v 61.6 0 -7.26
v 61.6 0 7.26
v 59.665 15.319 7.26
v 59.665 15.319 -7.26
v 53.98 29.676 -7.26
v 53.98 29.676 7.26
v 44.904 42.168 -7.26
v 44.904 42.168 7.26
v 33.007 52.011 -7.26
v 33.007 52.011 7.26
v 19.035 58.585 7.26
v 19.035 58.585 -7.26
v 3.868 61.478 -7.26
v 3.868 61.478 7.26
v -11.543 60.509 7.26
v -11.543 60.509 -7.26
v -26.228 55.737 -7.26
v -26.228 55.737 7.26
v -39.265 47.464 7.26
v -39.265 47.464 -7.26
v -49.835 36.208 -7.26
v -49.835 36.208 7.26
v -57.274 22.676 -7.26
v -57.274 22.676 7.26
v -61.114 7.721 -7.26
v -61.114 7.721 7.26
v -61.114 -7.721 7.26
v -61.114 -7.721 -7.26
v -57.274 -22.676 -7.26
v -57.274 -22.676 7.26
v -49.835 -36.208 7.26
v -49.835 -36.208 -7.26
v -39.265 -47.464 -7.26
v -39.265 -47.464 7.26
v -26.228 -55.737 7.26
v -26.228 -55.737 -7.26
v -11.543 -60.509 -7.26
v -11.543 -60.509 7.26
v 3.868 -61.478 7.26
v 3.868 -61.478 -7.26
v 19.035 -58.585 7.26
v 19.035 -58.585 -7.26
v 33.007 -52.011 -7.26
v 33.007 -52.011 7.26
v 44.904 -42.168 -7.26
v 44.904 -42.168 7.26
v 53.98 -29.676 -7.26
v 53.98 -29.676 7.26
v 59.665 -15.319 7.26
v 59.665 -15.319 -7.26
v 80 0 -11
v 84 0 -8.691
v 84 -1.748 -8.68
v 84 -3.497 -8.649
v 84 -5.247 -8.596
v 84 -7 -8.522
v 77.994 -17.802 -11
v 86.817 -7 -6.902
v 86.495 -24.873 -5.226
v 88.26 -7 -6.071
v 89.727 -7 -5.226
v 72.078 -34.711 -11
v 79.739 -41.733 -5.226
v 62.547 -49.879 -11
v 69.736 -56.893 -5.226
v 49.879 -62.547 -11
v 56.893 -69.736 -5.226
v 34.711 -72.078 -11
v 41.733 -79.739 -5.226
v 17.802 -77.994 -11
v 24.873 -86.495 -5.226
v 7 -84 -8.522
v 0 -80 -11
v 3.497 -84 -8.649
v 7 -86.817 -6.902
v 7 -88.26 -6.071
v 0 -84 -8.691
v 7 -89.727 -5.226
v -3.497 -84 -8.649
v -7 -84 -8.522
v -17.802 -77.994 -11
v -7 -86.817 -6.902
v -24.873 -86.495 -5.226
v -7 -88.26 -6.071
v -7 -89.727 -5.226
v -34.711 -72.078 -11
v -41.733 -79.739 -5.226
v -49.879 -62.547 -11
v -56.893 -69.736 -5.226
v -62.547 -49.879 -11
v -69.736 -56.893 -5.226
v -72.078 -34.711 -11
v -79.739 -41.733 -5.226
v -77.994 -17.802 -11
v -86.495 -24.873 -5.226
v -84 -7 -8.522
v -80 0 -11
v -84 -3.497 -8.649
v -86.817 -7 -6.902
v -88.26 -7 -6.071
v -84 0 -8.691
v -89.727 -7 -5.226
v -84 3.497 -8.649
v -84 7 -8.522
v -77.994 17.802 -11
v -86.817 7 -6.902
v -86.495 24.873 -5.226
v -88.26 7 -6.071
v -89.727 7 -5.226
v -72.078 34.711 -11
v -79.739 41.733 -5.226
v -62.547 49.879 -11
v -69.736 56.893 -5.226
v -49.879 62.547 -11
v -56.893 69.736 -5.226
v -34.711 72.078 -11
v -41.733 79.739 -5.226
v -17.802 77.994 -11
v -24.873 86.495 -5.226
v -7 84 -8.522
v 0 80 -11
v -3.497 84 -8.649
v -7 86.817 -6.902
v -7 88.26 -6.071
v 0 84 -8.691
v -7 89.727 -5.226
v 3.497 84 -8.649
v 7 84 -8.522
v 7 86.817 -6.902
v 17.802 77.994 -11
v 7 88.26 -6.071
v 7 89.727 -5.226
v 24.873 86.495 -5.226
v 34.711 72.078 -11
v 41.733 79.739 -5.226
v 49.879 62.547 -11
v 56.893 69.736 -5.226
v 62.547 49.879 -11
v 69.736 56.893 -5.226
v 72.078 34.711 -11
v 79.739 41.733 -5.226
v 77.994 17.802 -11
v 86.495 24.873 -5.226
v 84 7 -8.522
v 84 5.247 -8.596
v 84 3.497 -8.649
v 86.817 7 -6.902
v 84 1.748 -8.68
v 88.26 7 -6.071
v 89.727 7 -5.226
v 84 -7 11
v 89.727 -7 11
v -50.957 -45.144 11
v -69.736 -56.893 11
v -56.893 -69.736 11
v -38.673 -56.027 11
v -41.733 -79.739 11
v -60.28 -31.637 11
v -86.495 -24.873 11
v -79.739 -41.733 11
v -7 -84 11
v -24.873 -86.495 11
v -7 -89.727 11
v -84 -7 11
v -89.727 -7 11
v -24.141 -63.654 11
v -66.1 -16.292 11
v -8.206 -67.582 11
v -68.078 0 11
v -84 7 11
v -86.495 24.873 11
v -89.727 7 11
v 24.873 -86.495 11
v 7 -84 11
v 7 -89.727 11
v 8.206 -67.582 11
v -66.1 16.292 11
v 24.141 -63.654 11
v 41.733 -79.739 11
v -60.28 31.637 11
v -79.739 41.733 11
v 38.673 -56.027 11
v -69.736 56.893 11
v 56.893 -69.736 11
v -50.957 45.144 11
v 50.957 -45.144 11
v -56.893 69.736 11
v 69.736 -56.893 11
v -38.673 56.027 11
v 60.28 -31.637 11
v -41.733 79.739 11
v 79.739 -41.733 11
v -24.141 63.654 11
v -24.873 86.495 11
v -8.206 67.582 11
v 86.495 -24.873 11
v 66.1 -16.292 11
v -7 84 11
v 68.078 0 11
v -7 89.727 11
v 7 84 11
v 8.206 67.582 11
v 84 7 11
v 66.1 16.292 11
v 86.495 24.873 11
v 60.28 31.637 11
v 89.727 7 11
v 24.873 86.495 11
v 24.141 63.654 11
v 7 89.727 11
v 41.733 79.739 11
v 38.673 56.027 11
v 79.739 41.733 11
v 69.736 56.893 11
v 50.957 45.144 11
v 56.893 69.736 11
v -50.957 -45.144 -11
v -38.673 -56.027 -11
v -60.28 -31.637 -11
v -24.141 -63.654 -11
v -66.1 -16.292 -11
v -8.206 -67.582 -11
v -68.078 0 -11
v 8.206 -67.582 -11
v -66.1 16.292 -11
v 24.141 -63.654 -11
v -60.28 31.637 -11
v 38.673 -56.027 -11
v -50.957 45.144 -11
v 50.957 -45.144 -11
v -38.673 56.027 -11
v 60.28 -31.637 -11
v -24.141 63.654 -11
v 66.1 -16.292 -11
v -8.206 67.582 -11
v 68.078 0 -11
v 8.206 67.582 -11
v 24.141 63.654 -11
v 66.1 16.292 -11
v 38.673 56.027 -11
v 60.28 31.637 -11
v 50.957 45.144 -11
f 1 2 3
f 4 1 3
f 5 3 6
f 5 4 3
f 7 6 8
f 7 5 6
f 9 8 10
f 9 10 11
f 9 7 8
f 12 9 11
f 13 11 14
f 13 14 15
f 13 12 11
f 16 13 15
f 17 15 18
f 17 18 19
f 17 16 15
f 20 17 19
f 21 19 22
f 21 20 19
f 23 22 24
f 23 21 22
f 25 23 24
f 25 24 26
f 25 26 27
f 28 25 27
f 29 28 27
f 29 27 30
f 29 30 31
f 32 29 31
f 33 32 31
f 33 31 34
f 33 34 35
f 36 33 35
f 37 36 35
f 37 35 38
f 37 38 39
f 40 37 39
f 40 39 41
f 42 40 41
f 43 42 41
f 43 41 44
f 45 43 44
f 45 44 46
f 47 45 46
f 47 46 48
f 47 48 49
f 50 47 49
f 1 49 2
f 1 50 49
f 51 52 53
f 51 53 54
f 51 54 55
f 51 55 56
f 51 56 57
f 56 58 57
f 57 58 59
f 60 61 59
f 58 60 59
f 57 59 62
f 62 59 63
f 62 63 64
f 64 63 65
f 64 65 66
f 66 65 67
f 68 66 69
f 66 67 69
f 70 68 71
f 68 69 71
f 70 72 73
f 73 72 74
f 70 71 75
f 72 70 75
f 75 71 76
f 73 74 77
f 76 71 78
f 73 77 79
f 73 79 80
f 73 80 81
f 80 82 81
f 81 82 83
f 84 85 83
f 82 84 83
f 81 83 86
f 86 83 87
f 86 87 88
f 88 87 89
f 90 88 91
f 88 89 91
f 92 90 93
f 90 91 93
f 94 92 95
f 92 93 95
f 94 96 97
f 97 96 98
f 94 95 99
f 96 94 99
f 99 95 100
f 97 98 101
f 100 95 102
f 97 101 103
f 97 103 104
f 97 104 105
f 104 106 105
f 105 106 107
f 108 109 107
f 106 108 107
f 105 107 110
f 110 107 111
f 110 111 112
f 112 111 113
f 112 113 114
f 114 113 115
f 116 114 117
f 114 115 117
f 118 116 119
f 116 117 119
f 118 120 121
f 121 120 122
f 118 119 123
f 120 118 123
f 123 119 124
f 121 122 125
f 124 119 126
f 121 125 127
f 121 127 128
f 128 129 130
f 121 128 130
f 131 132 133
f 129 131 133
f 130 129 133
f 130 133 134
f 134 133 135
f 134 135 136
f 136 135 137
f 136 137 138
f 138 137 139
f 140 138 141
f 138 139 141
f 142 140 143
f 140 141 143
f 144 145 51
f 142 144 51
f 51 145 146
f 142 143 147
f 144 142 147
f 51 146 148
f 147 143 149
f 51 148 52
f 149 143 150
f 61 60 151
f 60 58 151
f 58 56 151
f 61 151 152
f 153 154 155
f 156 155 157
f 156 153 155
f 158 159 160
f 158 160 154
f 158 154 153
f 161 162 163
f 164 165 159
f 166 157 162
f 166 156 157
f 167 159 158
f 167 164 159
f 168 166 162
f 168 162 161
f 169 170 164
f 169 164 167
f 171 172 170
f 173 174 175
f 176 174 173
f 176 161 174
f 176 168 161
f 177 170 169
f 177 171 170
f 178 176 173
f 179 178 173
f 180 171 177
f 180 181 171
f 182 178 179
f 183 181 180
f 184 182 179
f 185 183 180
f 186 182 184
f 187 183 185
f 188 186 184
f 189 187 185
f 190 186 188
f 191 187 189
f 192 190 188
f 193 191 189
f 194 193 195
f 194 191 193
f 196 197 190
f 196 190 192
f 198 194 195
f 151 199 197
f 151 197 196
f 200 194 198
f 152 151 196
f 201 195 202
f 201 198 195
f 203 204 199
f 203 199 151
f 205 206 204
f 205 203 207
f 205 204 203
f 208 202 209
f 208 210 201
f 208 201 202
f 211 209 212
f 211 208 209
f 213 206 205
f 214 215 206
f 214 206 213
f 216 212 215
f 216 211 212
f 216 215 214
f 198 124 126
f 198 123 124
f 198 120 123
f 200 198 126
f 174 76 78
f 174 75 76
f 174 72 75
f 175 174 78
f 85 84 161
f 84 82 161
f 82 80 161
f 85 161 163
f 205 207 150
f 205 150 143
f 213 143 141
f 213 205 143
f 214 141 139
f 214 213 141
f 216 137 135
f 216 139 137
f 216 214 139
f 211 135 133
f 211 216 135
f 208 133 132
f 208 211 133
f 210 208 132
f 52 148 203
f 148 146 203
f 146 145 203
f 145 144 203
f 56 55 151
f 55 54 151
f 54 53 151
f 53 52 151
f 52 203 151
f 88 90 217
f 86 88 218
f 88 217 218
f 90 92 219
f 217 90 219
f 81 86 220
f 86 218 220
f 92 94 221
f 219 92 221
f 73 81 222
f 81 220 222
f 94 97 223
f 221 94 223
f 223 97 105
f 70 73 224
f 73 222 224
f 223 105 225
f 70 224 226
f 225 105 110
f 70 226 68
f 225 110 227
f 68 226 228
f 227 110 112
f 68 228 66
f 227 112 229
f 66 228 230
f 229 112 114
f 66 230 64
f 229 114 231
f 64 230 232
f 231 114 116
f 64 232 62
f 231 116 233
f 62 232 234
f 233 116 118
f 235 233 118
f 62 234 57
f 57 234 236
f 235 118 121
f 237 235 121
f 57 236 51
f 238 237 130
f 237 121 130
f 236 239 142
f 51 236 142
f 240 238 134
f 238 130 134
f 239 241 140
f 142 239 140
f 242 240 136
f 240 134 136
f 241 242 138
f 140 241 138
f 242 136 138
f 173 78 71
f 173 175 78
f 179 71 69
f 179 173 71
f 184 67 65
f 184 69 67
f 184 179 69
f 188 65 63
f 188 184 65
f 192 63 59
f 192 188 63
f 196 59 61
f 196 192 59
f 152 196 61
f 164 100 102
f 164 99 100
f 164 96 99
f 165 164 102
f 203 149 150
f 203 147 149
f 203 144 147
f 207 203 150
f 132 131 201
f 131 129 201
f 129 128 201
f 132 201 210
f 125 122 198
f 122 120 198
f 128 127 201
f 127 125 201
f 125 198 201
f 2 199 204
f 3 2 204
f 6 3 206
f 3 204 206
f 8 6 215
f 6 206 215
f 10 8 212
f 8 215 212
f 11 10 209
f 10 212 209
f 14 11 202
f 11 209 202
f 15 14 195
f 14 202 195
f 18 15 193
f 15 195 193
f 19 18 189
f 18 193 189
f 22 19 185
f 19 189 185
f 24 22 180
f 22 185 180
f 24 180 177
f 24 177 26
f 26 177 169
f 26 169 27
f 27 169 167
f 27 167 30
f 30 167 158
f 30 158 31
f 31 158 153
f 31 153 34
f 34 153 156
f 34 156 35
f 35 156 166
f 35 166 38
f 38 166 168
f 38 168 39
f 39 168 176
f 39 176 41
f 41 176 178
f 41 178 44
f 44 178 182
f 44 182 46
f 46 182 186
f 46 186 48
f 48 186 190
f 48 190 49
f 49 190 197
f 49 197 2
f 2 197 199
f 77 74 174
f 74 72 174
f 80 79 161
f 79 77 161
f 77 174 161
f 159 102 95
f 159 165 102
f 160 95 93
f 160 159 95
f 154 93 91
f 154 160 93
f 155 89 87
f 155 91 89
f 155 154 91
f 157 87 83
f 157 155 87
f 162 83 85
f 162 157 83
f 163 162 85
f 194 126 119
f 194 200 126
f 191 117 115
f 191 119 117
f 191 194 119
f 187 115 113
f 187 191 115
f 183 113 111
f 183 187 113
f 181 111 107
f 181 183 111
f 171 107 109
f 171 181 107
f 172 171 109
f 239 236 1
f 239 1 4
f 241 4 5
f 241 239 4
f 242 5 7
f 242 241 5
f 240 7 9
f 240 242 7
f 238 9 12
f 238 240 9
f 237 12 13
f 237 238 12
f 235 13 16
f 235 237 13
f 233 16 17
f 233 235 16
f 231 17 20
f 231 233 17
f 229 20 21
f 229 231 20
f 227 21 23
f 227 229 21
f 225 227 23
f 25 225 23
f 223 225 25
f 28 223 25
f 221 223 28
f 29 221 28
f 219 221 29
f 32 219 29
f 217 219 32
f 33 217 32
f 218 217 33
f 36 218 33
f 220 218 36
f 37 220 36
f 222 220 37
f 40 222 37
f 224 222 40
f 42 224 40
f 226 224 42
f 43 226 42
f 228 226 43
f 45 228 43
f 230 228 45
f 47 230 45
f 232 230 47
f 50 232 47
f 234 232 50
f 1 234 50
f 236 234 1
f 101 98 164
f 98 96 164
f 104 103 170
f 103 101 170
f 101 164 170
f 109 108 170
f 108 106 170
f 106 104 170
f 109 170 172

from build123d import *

# Parameters (mm, degrees)
SKICA1_R                 = 90
SKICA1_R_2               = 61.6
VYSUNOUT1_DEPTH          = 11
ZKOSIT2_SIZE             = 3.74
ZKOSIT2_SIZE2            = 6.47787002
ZKOSIT3_SIZE             = 3.74
ZKOSIT3_SIZE2            = 6.47787002
ODEBRAT_VYSUNUT_M1_REACH = 131.167
SKICA2_W                 = 14
SKICA2_H                 = 6
KRUHOV_POLE1_COUNT       = 4


with BuildPart() as part:
    # Skica1 → Vysunout1 (new, symmetric)
    with BuildSketch(Plane.XY):
        Circle(SKICA1_R)
        Circle(SKICA1_R_2, mode=Mode.SUBTRACT)
    extrude(amount=VYSUNOUT1_DEPTH, both=True)

    # Zkosit2
    zkosit2_edges = [part.edges().sort_by_distance(p)[0] for p in [
        (-61.6, 0, -11),
    ]]
    zkosit2_side = [part.faces().sort_by_distance(p)[0] for p in [
        (-61.6, 0, 0),
    ]]
    chamfer(zkosit2_edges, length=ZKOSIT2_SIZE, length2=ZKOSIT2_SIZE2, reference=zkosit2_side[0])

    # Zkosit3
    zkosit3_edges = [part.edges().sort_by_distance(p)[0] for p in [
        (-61.6, 0, 11),
    ]]
    zkosit3_side = [part.faces().sort_by_distance(p)[0] for p in [
        (-61.6, 0, 1.87),
    ]]
    chamfer(zkosit3_edges, length=ZKOSIT3_SIZE, length2=ZKOSIT3_SIZE2, reference=zkosit3_side[0])

    # Skica4 → Odebrat otočením1 (revolve, cut)
    with BuildSketch(Plane(origin=(0, 0, 0), x_dir=(1, 0, 0), z_dir=(0, 1, 0))):
        Polygon((90, 11), (80, 11), (90, 5.226497308), align=None)
    revolve(axis=Axis((0, 0, 0), (0, 0, -1)), mode=Mode.SUBTRACT)

    # Odebrat vysunutím1: up to this cone (the profile starts inside it)
    odebrat_vysunut_m1_end = Plane(origin=(0, 0, 11), z_dir=(0, 0, 1)).offset(-68.188020535) * Cone(1.732e-06, 550.723116052, 317.960138302, align=(Align.CENTER, Align.CENTER, Align.MIN), mode=Mode.PRIVATE)
    # Skica2 → Odebrat vysunutím1 (cut, up to the surface)
    with BuildSketch(Plane.XY.offset(11), mode=Mode.PRIVATE) as odebrat_vysunut_m1_sk1:
        with Locations((0, 87)):
            Rectangle(SKICA2_W, SKICA2_H)
    odebrat_vysunut_m1_tool1 = extrude(odebrat_vysunut_m1_sk1.sketch, amount=-ODEBRAT_VYSUNUT_M1_REACH, mode=Mode.PRIVATE) & odebrat_vysunut_m1_end
    odebrat_vysunut_m1 = odebrat_vysunut_m1_tool1.solids().sort_by_distance((0, 87, 11))[0]
    add(odebrat_vysunut_m1, mode=Mode.SUBTRACT)

    # Kruhové pole1: Odebrat vysunutím1 ×4 about axis
    kruhov_pole1_axis = Axis((0, 0, 0), (0, 0, 1))
    for i in range(1, KRUHOV_POLE1_COUNT):
        add(odebrat_vysunut_m1.rotate(kruhov_pole1_axis, i * 360 / KRUHOV_POLE1_COUNT), mode=Mode.SUBTRACT)


solid = part.part
